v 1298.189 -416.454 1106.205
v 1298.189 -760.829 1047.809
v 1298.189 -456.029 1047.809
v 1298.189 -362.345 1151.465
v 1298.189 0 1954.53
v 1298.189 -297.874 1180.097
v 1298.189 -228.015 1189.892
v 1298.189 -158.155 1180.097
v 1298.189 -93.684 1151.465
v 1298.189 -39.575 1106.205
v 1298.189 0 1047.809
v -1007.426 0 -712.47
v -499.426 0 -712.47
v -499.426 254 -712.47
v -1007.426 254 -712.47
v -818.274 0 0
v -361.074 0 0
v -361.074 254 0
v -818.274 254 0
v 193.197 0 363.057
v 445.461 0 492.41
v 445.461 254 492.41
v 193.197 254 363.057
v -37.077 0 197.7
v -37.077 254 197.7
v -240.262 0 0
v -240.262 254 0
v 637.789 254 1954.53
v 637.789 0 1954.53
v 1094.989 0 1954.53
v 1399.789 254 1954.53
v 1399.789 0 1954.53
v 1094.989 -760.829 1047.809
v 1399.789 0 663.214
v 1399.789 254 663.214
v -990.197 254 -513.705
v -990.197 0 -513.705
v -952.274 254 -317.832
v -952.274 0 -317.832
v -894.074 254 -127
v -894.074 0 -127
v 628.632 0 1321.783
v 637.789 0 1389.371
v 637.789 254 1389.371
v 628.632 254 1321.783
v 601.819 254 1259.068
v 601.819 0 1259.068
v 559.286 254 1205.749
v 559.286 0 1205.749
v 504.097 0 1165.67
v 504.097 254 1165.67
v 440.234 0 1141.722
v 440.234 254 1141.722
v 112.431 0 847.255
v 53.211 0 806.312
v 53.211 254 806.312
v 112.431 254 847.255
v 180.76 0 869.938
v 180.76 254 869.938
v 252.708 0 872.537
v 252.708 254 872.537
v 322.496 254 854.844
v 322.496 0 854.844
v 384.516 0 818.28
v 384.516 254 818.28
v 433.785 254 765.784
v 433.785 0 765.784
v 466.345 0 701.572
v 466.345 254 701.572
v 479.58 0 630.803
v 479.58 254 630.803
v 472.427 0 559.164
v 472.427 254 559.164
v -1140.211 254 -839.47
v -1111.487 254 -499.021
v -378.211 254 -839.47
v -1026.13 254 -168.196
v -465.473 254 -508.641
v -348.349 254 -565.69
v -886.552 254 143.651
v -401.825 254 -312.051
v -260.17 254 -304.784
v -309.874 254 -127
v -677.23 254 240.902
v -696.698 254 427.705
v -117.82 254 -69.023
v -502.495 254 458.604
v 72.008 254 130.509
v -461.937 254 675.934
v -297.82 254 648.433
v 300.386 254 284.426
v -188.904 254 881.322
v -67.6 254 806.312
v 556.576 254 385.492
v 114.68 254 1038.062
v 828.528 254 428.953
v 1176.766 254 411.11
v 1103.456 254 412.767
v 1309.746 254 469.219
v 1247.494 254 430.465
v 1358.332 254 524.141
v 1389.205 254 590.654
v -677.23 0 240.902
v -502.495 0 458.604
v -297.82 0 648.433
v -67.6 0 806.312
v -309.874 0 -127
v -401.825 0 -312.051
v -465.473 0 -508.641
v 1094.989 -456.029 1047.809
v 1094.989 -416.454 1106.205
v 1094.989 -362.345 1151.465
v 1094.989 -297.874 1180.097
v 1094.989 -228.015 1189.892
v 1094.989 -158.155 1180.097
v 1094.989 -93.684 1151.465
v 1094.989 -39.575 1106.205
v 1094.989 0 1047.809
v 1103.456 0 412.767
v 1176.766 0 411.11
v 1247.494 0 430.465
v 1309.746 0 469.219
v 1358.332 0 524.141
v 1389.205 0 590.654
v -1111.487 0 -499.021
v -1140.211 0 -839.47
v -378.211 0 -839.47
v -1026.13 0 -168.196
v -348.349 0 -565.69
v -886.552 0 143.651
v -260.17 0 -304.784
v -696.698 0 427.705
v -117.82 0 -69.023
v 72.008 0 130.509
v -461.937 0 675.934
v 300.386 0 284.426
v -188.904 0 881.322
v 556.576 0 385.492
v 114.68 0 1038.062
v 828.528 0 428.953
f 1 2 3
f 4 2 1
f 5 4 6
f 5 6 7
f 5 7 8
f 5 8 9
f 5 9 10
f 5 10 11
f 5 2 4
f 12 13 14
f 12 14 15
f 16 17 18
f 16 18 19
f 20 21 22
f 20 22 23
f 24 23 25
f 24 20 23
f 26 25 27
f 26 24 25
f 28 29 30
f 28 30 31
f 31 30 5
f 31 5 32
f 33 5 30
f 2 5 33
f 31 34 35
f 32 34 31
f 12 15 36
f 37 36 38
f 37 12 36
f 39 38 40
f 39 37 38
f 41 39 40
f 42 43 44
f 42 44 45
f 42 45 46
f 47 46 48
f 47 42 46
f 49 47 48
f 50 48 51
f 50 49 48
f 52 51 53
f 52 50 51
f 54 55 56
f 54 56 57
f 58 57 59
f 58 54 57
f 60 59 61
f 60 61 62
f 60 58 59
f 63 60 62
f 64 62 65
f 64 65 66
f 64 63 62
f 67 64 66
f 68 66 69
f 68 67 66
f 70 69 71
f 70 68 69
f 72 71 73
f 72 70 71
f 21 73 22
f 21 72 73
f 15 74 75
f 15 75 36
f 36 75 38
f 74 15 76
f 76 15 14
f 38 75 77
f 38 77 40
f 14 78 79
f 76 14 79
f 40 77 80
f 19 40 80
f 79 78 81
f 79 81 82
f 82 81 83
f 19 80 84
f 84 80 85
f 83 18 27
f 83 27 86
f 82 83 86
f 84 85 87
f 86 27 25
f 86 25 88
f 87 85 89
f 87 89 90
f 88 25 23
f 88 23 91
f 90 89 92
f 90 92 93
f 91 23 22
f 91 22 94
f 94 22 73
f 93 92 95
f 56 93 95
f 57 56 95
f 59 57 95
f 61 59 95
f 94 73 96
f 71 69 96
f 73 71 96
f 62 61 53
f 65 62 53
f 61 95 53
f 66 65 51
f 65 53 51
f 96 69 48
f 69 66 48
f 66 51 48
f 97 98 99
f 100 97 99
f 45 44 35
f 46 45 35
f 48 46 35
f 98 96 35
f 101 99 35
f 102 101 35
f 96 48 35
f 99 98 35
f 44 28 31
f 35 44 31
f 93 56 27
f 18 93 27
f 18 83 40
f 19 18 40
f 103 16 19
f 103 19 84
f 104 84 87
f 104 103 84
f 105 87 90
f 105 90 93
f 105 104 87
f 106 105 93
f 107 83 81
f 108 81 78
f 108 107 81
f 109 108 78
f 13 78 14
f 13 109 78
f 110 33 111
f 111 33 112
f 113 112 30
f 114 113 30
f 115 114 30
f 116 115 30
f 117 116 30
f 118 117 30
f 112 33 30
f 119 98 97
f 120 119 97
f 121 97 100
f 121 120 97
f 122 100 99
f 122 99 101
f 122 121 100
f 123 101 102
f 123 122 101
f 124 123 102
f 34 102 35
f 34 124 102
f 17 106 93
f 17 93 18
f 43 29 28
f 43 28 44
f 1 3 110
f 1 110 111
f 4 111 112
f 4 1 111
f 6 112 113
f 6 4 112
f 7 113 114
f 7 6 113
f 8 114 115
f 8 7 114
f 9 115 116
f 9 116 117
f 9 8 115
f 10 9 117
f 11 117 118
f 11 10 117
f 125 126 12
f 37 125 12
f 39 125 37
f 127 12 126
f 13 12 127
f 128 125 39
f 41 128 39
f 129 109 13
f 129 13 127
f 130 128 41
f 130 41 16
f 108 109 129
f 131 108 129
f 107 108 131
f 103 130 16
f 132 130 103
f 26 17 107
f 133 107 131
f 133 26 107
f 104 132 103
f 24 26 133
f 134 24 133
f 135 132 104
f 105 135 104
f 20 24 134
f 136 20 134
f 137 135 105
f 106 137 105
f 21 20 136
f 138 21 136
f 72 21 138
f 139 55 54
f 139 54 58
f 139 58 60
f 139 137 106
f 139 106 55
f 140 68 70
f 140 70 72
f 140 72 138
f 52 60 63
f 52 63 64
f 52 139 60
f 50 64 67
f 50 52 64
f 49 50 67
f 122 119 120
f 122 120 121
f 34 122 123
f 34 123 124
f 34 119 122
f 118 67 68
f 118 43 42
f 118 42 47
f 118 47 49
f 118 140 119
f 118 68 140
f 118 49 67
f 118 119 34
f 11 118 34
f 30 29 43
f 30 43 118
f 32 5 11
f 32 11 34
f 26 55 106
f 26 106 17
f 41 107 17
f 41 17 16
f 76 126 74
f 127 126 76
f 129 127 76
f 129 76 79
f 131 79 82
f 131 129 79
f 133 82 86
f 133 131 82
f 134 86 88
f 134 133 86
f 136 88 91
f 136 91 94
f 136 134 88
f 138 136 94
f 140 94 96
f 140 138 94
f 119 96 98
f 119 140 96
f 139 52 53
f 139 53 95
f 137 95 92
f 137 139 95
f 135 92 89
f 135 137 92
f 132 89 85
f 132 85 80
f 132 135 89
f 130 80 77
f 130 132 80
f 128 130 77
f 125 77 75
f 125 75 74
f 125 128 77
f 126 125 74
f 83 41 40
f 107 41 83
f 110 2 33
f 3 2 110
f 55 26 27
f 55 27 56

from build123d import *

# Parameters (mm, degrees)
F1_DEPTH = 254
F0_W     = 203.2
F0_H     = 762
F2_DEPTH = 254
F4_START = -101.6
F4_DEPTH = 203.2


with BuildPart() as f1:
    # F0 (on Front) → F1 (new body)
    with BuildSketch(Plane.XZ):
        with BuildLine():
            ThreePointArc((-378.2106060492, -839.47), (72.0079190036, 130.508522099), (1103.4560606175, 412.7668874228))
            ThreePointArc((1103.4560606175, 412.7668874228), (1309.7456889403, 469.2185604875), (1399.7893939508, 663.2142649073))
            Line((1399.7893939508, 663.2142649073), (1399.7893939508, 1954.53))
            Line((1399.7893939508, 1954.53), (1298.1893939508, 1954.53))
            Line((1298.1893939508, 1954.53), (1298.1893939508, 1192.53))
            Line((1298.1893939508, 1192.53), (1094.9893939508, 1192.53))
            Line((1094.9893939508, 1192.53), (1094.9893939508, 1954.53))
            Line((1094.9893939508, 1954.53), (1018.7893939508, 1954.53))
            Line((1018.7893939508, 1954.53), (637.7893939508, 1954.53))
            Line((637.7893939508, 1954.53), (637.7893939508, 1389.3709543976))
            ThreePointArc((637.7893939508, 1389.3709543976), (582.3503277833, 1230.9741250242), (440.2338383953, 1141.7219594645))
            ThreePointArc((440.2338383953, 1141.7219594645), (-696.6980767094, 427.7046349874), (-1140.2106060492, -839.47))
            Line((-1140.2106060492, -839.47), (-378.2106060492, -839.47))
        make_face()
        with BuildLine():
            Line((-499.4259021123, -712.47), (-1007.4259021123, -712.47))
            ThreePointArc((-1007.4259021123, -712.47), (-973.8016007956, -415.2720405308), (-894.074244136, -127))
            Line((-894.074244136, -127), (-309.874244136, -127))
            ThreePointArc((-309.874244136, -127), (-437.2888851639, -409.167864303), (-499.4259021123, -712.47))
        make_face(mode=Mode.SUBTRACT)
        with BuildLine():
            Line((-361.073505214, 0), (-818.273505214, 0))
            ThreePointArc((-818.273505214, 0), (-502.4948684201, 458.6041102514), (-67.6001175036, 806.3115059452))
            Line((-67.6001175036, 806.3115059452), (-361.073505214, 0))
        make_face(mode=Mode.SUBTRACT)
        with BuildLine():
            Line((-240.2620981708, 0), (53.2112895396, 806.3115059452))
            ThreePointArc((53.2112895396, 806.3115059452), (384.5158279566, 818.280267068), (445.4607170033, 492.4096348878))
            ThreePointArc((445.4607170033, 492.4096348878), (74.9794651856, 284.6678287228), (-240.2620981708, 0))
        make_face(mode=Mode.SUBTRACT)
    extrude(amount=-F1_DEPTH)

    # F0 (on Front) → F2 (join)
    with BuildSketch(Plane.XZ):
        with Locations((1196.5893939508, 1573.53)):
            Rectangle(F0_W, F0_H)
    extrude(amount=-F2_DEPTH)

    # F3 (on face) → F4 (join)
    with BuildSketch(Plane.YZ.offset(1399.7893939508).offset(F4_START)):
        with BuildLine():
            Line((0, 1047.8091553467), (0, 1954.53))
            Line((0, 1954.53), (-760.8291263294, 1047.8091553467))
            Line((-760.8291263294, 1047.8091553467), (-456.0291263294, 1047.8091553467))
            ThreePointArc((-456.0291263294, 1047.8091553467), (-228.0145631647, 1189.8924051043), (0, 1047.8091553467))
        make_face()
    extrude(amount=-F4_DEPTH)


solid = f1.part
